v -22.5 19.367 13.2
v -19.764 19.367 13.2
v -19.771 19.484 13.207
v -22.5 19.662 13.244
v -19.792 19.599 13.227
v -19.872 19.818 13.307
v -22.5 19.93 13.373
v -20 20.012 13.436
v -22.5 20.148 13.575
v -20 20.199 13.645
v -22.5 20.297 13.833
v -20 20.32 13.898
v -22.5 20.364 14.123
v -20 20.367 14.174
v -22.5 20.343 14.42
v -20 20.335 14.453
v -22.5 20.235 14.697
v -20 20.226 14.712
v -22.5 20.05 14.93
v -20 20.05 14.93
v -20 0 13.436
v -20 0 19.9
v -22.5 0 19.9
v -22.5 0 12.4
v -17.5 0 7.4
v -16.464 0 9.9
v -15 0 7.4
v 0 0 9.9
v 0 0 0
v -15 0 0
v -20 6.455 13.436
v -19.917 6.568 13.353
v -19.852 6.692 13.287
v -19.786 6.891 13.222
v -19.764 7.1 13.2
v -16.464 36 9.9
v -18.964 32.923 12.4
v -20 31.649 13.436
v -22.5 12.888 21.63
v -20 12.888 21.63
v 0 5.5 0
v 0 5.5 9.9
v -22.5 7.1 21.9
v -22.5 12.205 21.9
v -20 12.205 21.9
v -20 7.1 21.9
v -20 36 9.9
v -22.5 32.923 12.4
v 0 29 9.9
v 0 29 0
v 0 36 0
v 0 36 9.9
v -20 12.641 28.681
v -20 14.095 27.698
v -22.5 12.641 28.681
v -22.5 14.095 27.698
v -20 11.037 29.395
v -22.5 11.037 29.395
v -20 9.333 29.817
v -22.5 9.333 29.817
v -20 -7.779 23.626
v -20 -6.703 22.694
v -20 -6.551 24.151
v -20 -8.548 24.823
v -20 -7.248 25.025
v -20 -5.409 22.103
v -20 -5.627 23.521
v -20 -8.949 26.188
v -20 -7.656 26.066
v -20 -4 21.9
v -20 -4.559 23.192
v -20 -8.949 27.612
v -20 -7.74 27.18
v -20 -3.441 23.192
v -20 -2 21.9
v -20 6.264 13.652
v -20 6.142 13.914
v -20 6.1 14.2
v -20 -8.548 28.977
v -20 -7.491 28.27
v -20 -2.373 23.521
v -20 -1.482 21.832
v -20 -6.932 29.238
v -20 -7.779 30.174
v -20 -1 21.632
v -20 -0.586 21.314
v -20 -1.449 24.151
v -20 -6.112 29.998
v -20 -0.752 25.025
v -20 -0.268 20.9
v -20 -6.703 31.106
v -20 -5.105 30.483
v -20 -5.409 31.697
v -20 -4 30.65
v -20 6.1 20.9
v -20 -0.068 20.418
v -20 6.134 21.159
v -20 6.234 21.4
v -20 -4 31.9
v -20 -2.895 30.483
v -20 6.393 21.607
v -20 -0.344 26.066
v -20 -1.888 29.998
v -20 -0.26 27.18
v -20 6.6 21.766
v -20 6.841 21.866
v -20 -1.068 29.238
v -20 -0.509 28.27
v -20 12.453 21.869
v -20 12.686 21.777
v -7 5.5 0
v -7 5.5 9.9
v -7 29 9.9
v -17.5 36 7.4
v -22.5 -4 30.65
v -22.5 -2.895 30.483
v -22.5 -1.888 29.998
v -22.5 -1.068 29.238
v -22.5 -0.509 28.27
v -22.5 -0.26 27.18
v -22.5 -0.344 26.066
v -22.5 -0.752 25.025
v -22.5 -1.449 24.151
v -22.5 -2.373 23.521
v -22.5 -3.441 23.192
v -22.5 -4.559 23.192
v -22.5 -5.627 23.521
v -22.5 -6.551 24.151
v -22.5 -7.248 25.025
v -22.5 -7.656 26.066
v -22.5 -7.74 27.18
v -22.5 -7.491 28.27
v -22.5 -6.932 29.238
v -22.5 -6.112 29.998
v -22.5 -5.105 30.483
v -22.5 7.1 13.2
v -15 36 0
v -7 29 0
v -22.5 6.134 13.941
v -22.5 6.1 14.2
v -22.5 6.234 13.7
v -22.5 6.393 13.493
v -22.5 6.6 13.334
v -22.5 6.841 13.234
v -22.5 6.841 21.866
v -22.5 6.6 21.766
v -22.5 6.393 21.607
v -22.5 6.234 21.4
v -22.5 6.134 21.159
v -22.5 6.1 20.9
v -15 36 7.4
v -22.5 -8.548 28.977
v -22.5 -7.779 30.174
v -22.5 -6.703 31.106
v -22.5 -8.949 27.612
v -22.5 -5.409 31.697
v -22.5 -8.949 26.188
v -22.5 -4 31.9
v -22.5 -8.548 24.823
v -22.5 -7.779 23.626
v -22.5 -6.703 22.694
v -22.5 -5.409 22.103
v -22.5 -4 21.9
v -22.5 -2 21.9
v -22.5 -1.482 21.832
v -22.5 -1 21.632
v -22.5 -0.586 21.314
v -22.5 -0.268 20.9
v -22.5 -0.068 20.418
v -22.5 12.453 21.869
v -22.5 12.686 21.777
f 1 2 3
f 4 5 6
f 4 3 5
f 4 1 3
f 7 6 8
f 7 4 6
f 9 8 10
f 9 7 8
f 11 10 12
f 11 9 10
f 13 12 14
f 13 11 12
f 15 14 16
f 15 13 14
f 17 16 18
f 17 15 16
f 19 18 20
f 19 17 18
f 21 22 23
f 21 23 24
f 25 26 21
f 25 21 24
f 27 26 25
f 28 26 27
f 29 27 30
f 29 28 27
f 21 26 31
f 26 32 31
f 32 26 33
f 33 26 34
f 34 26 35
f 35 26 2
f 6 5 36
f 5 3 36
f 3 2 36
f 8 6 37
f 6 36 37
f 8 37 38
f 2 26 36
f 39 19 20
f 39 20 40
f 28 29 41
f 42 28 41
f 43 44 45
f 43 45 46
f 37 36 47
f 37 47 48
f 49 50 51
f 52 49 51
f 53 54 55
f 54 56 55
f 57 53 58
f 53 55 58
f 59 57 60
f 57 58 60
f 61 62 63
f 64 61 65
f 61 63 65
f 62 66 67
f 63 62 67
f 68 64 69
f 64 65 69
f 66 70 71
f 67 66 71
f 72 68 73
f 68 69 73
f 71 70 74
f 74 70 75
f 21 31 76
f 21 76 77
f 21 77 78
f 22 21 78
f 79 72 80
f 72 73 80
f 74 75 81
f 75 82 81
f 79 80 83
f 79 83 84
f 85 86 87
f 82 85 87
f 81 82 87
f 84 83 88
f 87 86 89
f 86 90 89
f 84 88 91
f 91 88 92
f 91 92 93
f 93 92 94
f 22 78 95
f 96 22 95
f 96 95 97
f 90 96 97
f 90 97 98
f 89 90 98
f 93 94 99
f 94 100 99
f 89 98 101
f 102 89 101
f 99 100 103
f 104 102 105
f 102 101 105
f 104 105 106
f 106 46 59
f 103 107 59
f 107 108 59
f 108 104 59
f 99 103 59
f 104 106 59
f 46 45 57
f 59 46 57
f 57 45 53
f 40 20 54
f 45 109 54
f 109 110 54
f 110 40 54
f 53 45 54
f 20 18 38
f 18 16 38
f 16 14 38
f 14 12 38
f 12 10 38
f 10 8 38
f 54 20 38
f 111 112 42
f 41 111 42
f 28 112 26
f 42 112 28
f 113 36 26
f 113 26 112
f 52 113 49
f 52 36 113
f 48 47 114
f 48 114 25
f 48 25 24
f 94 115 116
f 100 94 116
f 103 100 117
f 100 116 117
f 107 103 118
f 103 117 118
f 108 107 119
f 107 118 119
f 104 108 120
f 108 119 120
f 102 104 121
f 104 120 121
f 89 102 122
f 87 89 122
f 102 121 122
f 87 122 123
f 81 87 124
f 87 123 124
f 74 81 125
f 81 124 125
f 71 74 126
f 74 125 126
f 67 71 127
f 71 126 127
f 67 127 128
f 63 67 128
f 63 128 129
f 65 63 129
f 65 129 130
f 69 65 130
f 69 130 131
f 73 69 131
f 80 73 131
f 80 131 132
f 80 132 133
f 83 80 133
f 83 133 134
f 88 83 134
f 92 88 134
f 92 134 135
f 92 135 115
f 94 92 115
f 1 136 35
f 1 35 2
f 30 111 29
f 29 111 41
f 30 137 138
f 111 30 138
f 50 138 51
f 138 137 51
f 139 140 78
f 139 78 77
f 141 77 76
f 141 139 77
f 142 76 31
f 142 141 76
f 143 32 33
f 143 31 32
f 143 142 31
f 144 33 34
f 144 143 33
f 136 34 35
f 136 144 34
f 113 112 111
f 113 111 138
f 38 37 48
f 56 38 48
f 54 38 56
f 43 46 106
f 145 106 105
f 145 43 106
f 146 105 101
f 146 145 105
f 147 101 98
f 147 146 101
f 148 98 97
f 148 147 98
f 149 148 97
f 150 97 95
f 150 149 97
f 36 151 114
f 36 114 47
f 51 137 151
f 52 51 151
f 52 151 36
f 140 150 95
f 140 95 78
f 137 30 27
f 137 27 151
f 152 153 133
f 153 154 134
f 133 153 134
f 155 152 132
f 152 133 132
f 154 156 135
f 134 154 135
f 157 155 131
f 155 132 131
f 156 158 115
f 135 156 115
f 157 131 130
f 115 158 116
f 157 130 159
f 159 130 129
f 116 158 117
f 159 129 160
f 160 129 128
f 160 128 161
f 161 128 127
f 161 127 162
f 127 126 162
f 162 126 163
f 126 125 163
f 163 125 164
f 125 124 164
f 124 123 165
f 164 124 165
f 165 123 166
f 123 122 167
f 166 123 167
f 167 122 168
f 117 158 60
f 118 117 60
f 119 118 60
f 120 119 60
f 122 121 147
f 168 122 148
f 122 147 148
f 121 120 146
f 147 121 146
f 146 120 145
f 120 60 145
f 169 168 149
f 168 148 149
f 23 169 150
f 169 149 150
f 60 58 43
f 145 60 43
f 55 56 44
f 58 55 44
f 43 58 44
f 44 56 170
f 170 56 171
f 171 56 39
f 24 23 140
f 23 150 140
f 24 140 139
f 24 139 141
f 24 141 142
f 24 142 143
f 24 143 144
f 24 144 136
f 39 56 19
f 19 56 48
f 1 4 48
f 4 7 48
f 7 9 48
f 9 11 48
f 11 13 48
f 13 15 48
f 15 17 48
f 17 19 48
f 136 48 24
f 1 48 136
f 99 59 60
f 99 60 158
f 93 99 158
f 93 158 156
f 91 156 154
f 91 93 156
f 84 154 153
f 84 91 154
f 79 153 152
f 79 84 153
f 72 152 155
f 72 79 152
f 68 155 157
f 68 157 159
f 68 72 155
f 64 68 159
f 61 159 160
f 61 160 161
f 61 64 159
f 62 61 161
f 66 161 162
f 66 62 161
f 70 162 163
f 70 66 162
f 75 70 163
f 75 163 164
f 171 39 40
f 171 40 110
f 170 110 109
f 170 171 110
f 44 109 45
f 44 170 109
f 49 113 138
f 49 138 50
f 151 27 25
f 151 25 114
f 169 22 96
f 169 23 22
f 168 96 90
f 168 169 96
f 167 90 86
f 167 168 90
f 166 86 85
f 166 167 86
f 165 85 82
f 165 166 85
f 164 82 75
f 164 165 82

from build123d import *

# Parameters (mm, degrees)
SZKIC1_W                    = 15
SZKIC1_H                    = 36
DODANIE_WYCI_GNI_CIE1_DEPTH = 9.9
SZKIC2_W                    = 7
SZKIC2_H                    = 23.5
WYTNIJ_WYCI_GNI_CIE1_DEPTH  = 9.9
SZKIC3_R                    = 2.5
DODANIE_WYCI_GNI_CIE2_DEPTH = 7.5
WYTNIJ_WYCI_GNI_CIE2_DEPTH  = 137.5
WYTNIJ_WYCI_GNI_CIE3_DEPTH  = 137.5
ZAOKR_GLENIE1_R             = 10
ZAOKR_GLENIE2_R             = 2
SZKIC6_R                    = 3.75
WYTNIJ_WYCI_GNI_CIE4_DEPTH  = 10


with BuildPart() as part:
    # Szkic1 → Dodanie-wyciągnięcie1 (new body)
    with BuildSketch(Plane.XY):
        with Locations((-7.5, 18)):
            Rectangle(SZKIC1_W, SZKIC1_H)
    extrude(amount=DODANIE_WYCI_GNI_CIE1_DEPTH)

    # Szkic2 → Wytnij-wyciągnięcie1 (cut)
    with BuildSketch(Plane.XY.offset(9.9)):
        with Locations((-3.5, 17.25)):
            Rectangle(SZKIC2_W, SZKIC2_H)
    extrude(amount=-WYTNIJ_WYCI_GNI_CIE1_DEPTH, mode=Mode.SUBTRACT)

    # Szkic3 → Dodanie-wyciągnięcie2 (add)
    with BuildSketch(Plane.ZY.offset(15)):
        with BuildLine():
            Line((7.4, 36), (9.9, 36))
            Line((9.9, 36), (12.4, 32.923076923))
            Line((12.4, 32.923076923), (29.4, 12))
            Line((29.4, 12), (31.9, -4))
            ThreePointArc((31.9, -4), (26.9, -9), (21.9, -4))
            Line((21.9, -4), (21.9, 0))
            Line((21.9, 0), (12.4, 0))
            Line((12.4, 0), (7.4, 0))
            Line((7.4, 0), (7.4, 36))
        make_face()
        with Locations((26.9, -4)):
            Circle(SZKIC3_R, mode=Mode.SUBTRACT)
    extrude(amount=DODANIE_WYCI_GNI_CIE2_DEPTH)

    # Szkic4 → Wytnij-wyciągnięcie2 (cut)
    with BuildSketch(Plane(origin=(0, 36, 0), x_dir=(1, 0, 0), z_dir=(0, 1, 0))):
        Polygon((-17.5, -7.4), (-25.001097051, -14.901097051), (-26.525986736, -7.4), align=None)
        Polygon((-16.464466094, -9.9), (-20, -13.435533906), (-20, -34.97095788), (-2.856589665, -34.97095788), (-4.384348652, -9.9), align=None)
    extrude(amount=-WYTNIJ_WYCI_GNI_CIE2_DEPTH, mode=Mode.SUBTRACT)

    # Szkic5 → Wytnij-wyciągnięcie3 (cut)
    with BuildSketch(Plane.ZY.offset(22.5)):
        with BuildLine():
            Line((14.930271414, 20.050399523), (21.630271414, 12.888330558))
            ThreePointArc((21.630271414, 12.888330558), (21.830126715, 12.572412171), (21.9, 12.205173429))
            Line((21.9, 12.205173429), (21.9, 7.1))
            ThreePointArc((21.9, 7.1), (21.607106781, 6.392893219), (20.9, 6.1))
            Line((20.9, 6.1), (14.2, 6.1))
            ThreePointArc((14.2, 6.1), (13.492893219, 6.392893219), (13.2, 7.1))
            Line((13.2, 7.1), (13.2, 19.367242395))
            ThreePointArc((13.2, 19.367242395), (13.832761259, 20.29736911), (14.930271414, 20.050399523))
        make_face()
    extrude(amount=-WYTNIJ_WYCI_GNI_CIE3_DEPTH, mode=Mode.SUBTRACT)

    # Zaokrąglenie1
    zaokr_glenie1_edges = [part.edges().sort_by_distance(p)[0] for p in [
        (-21.25, 12, 29.4),
    ]]
    fillet(zaokr_glenie1_edges, radius=ZAOKR_GLENIE1_R)

    # Zaokrąglenie2
    zaokr_glenie2_edges = [part.edges().sort_by_distance(p)[0] for p in [
        (-21.25, 0, 21.9),
    ]]
    fillet(zaokr_glenie2_edges, radius=ZAOKR_GLENIE2_R)

    # Szkic6 → Wytnij-wyciągnięcie4 (cut)
    with BuildSketch(Plane.ZY.offset(22.5)):
        with Locations((26.9, -4)):
            Circle(SZKIC6_R)
    extrude(amount=-WYTNIJ_WYCI_GNI_CIE4_DEPTH, mode=Mode.SUBTRACT)


solid = part.part
